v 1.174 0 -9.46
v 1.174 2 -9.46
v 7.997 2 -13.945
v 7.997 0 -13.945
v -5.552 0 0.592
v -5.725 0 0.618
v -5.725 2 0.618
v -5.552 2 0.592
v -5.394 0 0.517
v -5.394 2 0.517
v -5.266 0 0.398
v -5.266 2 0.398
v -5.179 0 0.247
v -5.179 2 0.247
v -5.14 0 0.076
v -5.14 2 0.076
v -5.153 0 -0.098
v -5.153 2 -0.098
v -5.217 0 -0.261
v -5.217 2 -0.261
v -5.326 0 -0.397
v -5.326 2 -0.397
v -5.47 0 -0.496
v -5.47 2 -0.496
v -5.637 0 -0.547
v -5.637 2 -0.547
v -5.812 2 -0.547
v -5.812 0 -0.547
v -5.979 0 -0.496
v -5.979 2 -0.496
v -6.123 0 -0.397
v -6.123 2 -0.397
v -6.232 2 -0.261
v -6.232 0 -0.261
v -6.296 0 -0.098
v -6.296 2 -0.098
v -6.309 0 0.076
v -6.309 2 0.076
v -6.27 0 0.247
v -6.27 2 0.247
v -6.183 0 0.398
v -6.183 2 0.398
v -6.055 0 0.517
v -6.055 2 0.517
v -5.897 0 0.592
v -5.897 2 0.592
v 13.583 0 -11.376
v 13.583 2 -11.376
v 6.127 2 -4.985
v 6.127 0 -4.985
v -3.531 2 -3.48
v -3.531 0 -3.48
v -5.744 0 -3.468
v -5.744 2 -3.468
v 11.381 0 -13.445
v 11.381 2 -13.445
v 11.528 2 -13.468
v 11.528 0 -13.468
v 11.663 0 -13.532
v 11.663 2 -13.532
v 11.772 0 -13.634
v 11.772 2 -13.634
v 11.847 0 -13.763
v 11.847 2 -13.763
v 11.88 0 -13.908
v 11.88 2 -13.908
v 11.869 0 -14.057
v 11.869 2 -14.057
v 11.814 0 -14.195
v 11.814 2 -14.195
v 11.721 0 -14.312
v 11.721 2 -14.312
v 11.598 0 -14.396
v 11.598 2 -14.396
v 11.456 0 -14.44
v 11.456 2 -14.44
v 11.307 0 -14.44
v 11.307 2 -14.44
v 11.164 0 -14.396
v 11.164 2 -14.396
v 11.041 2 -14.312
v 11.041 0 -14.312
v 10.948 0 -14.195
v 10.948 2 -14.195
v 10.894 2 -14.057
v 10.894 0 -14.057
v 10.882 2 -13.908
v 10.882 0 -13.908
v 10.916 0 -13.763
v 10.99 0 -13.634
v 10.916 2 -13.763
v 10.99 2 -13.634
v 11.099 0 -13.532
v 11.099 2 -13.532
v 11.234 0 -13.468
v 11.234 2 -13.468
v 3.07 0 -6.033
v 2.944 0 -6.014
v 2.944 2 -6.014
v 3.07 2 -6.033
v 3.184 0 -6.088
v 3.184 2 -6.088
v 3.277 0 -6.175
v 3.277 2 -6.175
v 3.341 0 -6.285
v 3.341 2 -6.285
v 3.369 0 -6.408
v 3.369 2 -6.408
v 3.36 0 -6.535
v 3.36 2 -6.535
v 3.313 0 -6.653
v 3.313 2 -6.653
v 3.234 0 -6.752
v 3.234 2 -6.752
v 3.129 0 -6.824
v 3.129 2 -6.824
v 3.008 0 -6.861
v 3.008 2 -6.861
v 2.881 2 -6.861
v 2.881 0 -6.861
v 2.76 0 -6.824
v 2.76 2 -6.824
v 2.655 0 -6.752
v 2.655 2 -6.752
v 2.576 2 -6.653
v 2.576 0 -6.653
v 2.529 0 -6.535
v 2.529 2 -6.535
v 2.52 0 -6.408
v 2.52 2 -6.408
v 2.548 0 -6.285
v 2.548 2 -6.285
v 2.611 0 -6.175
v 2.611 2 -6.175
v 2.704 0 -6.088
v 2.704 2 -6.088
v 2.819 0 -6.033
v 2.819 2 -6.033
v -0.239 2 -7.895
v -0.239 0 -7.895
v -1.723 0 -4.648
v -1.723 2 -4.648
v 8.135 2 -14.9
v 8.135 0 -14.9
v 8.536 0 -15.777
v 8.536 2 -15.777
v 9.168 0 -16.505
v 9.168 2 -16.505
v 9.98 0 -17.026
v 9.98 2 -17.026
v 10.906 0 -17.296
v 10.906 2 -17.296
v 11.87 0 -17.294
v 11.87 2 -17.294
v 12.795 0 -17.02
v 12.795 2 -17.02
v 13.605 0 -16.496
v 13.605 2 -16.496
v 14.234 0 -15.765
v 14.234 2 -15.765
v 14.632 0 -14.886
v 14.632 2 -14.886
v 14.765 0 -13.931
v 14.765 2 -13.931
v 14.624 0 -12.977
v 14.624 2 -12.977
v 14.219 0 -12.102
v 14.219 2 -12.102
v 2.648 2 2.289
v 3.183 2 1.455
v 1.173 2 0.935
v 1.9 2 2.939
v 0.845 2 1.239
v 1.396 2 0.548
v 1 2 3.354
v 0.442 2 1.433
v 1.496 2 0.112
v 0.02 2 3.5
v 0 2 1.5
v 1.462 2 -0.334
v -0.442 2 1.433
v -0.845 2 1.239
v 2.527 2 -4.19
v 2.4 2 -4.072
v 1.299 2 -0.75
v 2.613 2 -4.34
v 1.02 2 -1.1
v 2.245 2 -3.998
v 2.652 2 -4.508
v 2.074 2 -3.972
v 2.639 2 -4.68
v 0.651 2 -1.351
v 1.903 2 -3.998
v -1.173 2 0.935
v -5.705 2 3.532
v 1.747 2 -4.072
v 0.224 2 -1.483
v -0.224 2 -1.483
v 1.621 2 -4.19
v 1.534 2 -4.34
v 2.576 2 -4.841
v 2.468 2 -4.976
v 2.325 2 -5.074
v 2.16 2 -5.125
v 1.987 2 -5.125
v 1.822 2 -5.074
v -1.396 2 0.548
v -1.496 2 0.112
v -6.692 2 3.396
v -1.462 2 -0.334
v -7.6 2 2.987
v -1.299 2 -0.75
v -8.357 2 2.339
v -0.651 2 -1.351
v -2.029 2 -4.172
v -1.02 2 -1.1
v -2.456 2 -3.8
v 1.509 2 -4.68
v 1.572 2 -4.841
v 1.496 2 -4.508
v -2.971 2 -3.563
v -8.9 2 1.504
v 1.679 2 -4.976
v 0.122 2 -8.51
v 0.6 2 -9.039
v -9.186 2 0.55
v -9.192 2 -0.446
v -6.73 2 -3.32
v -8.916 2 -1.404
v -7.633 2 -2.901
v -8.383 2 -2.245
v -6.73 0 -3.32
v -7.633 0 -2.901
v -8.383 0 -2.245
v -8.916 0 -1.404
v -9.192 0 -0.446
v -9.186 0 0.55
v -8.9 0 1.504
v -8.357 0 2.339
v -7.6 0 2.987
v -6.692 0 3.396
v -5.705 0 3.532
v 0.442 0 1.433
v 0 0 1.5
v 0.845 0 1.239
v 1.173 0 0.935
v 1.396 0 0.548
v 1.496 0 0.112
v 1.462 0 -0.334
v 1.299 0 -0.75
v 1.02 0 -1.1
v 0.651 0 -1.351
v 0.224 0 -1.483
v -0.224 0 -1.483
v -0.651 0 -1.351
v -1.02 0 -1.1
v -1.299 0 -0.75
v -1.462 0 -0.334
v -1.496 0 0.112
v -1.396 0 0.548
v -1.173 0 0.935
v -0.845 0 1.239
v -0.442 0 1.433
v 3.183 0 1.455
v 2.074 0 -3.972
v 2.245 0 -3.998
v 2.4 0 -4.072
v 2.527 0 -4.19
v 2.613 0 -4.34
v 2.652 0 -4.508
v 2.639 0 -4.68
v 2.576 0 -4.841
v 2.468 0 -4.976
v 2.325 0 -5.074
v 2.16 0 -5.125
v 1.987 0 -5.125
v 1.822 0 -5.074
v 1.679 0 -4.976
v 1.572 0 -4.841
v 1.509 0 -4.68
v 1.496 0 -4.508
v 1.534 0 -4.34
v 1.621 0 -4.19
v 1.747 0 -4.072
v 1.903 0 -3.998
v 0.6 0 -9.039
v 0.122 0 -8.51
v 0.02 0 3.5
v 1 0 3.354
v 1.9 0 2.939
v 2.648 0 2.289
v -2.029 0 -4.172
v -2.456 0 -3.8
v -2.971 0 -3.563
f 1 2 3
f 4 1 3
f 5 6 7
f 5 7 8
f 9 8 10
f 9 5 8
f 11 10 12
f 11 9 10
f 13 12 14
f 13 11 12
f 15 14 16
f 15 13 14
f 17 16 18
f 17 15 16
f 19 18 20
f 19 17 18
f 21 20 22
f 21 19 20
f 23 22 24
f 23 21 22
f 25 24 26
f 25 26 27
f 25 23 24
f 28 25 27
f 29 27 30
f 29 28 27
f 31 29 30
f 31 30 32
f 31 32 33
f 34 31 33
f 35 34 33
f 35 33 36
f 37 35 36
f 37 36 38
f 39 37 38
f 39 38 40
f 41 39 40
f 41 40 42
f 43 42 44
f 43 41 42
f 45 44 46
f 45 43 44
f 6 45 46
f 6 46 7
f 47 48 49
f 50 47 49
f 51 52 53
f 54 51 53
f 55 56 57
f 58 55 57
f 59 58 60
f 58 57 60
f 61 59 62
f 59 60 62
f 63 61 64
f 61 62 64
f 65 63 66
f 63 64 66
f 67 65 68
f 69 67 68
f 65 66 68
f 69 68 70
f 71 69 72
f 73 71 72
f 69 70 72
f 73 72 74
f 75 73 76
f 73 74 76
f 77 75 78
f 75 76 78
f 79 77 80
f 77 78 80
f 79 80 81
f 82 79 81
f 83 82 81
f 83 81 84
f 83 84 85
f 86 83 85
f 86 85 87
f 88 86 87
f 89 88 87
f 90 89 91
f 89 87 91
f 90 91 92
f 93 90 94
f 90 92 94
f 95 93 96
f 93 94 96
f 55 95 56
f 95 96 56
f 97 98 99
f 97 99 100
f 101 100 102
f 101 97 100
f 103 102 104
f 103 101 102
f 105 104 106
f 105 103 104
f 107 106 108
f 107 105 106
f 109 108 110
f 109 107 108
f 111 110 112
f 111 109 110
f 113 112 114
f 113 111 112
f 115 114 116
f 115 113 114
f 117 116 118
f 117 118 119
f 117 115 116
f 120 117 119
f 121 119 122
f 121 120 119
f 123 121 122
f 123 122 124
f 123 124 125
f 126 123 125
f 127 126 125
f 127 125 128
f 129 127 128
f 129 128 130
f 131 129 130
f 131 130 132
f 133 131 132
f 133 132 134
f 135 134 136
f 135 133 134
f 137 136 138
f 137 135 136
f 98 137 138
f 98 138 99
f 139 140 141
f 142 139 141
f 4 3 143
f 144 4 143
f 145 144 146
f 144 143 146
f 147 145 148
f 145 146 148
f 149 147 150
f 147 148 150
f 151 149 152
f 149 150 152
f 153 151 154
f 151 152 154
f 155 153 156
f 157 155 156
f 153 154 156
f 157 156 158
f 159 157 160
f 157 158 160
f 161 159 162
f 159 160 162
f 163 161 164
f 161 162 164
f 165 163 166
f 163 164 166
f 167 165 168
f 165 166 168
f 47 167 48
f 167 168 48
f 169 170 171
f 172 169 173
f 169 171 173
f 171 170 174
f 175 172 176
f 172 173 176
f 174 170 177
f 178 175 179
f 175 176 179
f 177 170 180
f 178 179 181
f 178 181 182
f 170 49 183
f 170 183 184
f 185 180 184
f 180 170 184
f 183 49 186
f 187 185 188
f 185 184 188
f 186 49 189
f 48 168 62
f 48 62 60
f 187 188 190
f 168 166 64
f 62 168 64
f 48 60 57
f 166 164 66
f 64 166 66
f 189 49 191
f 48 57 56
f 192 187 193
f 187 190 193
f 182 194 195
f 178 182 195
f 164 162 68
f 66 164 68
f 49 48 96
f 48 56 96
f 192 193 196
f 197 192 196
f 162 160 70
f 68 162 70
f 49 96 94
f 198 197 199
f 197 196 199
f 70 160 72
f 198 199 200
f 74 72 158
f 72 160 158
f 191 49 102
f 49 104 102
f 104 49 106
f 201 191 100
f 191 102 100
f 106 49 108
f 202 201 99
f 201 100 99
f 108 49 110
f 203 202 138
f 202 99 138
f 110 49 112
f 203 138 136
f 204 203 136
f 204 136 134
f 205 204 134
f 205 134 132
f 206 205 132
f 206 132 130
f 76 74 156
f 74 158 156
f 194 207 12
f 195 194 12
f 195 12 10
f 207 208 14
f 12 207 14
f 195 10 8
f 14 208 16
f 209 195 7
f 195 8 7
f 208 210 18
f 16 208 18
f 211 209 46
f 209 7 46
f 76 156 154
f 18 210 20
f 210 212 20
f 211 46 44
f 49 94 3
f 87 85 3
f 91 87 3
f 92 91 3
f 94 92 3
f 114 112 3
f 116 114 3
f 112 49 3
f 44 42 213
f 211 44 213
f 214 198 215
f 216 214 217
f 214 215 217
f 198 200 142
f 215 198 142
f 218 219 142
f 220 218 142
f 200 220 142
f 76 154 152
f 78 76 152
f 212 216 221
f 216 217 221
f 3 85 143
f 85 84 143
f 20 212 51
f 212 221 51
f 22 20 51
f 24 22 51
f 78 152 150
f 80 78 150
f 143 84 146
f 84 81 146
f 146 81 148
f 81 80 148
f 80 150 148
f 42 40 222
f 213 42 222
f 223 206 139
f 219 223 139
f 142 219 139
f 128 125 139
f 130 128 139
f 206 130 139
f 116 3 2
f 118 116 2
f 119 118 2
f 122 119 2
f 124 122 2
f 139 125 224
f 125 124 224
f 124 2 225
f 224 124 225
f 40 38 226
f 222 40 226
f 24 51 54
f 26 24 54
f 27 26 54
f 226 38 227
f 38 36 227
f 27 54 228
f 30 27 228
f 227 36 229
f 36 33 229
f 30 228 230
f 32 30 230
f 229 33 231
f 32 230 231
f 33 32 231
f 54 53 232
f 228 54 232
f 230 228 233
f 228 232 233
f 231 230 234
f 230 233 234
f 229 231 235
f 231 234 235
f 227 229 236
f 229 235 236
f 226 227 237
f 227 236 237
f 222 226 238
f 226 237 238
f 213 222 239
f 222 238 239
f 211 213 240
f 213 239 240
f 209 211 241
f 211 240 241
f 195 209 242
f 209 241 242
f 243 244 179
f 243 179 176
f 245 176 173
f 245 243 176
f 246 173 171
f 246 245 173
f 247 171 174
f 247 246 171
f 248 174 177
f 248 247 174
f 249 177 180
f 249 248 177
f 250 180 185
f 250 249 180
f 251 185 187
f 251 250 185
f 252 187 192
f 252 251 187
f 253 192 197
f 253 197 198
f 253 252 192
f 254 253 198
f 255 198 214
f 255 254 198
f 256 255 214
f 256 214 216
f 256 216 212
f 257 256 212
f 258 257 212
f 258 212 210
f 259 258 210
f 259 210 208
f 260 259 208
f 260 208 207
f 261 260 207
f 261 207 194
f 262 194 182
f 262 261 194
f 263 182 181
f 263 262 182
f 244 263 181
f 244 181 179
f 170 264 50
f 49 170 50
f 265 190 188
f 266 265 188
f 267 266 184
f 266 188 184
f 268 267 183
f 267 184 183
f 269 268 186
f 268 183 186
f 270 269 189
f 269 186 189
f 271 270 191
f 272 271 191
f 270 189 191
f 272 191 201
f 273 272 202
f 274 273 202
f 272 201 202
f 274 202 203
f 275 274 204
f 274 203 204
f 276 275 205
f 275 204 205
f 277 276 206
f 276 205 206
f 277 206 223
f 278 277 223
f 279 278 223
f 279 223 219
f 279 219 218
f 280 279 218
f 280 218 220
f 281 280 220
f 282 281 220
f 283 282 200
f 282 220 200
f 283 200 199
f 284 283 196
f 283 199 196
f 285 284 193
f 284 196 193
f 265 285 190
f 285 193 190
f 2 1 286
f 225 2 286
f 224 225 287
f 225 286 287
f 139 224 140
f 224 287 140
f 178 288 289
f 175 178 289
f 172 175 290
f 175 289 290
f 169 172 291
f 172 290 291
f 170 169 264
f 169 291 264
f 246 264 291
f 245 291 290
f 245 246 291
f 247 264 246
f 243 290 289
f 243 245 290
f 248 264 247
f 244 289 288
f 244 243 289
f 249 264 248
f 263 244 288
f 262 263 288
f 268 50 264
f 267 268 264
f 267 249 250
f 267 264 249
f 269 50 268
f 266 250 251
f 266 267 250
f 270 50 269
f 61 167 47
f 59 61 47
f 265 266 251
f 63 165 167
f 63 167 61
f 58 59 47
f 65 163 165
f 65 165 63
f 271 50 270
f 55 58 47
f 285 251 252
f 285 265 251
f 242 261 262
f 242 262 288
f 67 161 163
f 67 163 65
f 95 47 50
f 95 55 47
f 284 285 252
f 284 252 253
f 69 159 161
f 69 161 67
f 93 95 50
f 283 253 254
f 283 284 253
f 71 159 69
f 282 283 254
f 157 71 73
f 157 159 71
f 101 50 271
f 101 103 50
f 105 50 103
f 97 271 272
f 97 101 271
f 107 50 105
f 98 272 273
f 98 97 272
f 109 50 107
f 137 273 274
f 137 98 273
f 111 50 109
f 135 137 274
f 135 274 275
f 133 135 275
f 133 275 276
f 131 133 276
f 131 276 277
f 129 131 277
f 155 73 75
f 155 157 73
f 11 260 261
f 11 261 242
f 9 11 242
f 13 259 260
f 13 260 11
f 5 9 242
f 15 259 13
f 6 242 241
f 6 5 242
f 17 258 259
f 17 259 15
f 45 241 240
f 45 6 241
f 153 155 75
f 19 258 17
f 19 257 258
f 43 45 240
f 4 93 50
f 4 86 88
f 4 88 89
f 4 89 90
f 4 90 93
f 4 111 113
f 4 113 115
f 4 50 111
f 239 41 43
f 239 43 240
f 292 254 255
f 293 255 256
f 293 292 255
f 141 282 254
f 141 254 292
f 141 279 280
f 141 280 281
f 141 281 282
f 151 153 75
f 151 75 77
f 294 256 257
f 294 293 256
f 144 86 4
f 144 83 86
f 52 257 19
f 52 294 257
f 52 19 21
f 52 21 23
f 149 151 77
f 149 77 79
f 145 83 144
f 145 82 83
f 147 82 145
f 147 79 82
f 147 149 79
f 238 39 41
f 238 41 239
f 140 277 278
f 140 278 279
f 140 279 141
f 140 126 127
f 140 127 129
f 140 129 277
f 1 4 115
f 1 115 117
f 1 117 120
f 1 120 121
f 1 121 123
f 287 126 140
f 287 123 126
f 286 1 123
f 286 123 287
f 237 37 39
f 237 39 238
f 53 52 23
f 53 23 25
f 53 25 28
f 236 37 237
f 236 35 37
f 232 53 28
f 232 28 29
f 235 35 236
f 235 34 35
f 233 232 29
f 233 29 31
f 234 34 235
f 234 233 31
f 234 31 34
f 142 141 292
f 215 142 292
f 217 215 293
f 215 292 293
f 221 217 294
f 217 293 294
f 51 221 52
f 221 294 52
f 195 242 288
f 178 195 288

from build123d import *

# Parameters (mm, degrees)
SKETCH1_R           = 1.5
SKETCH1_R_2         = 0.586127488
SKETCH1_R_3         = 0.42585763
BOSS_EXTRUDE1_DEPTH = 2
SKETCH3_R           = 0.579621875
CUT_EXTRUDE1_DEPTH  = 2
SKETCH4_R           = 0.5
BOSS_EXTRUDE3_DEPTH = 2


with BuildPart() as part:
    # Sketch1 → Boss-Extrude1 (new body)
    with BuildSketch(Plane(origin=(0, 0, 0), x_dir=(1, 0, 0), z_dir=(0, 1, 0))):
        with BuildLine():
            Line((-5.704810184, -3.532312602), (0.0197897, -3.499944052))
            ThreePointArc((0.0197897, -3.499944052), (1.899950502, -2.939419686), (3.183109291, -1.455271536))
            Line((3.183109291, -1.455271536), (6.127465187, 4.984905694))
            ThreePointArc((6.127465187, 4.984905694), (4.399627432, 9.62328652), (-0.238753394, 7.895448766))
            Line((-0.238753394, 7.895448766), (-1.72322244, 4.648475885))
            ThreePointArc((-1.72322244, 4.648475885), (-2.456456033, 3.800391228), (-3.530833635, 3.48009159))
            Line((-3.530833635, 3.48009159), (-5.744389584, 3.467575502))
            ThreePointArc((-5.744389584, 3.467575502), (-9.224543936, -0.05215825), (-5.704810184, -3.532312602))
        make_face()
        with Locations(Location((0, 0, 0), (0, 0, 270))):
            Circle(SKETCH1_R, mode=Mode.SUBTRACT)
        with Locations(Location((-5.724599884, -0.03236855, 0), (0, 0, 270))):
            Circle(SKETCH1_R_2, mode=Mode.SUBTRACT)
        with Locations(Location((2.944355896, 6.44017723, 0), (0, 0, 270))):
            Circle(SKETCH1_R_3, mode=Mode.SUBTRACT)
    extrude(amount=BOSS_EXTRUDE1_DEPTH)

    # Sketch3 → Cut-Extrude1 (cut)
    with BuildSketch(Plane(origin=(0, 2, 0), x_dir=(1, 0, 0), z_dir=(0, 1, 0))):
        with Locations(Location((2.073730064, 4.551378241, 0), (0, 0, 270))):
            Circle(SKETCH3_R)
    extrude(amount=-CUT_EXTRUDE1_DEPTH, mode=Mode.SUBTRACT)

    # Sketch4 → Boss-Extrude3 (add)
    with BuildSketch(Plane(origin=(0, 2, 0), x_dir=(1, 0, 0), z_dir=(0, 1, 0))):
        with BuildLine():
            Line((13.583389447, 11.376075771), (6.127465187, 4.984905694))
            Line((6.127465187, 4.984905694), (0.873997954, 9.262165534))
            Line((0.873997954, 9.262165534), (7.997134718, 13.945290547))
            ThreePointArc((7.997134718, 13.945290547), (12.795032794, 17.01966473), (13.583389447, 11.376075771))
        make_face()
        with Locations(Location((11.381075149, 13.945290547, 0), (0, 0, 270))):
            Circle(SKETCH4_R, mode=Mode.SUBTRACT)
    extrude(amount=-BOSS_EXTRUDE3_DEPTH)


solid = part.part
